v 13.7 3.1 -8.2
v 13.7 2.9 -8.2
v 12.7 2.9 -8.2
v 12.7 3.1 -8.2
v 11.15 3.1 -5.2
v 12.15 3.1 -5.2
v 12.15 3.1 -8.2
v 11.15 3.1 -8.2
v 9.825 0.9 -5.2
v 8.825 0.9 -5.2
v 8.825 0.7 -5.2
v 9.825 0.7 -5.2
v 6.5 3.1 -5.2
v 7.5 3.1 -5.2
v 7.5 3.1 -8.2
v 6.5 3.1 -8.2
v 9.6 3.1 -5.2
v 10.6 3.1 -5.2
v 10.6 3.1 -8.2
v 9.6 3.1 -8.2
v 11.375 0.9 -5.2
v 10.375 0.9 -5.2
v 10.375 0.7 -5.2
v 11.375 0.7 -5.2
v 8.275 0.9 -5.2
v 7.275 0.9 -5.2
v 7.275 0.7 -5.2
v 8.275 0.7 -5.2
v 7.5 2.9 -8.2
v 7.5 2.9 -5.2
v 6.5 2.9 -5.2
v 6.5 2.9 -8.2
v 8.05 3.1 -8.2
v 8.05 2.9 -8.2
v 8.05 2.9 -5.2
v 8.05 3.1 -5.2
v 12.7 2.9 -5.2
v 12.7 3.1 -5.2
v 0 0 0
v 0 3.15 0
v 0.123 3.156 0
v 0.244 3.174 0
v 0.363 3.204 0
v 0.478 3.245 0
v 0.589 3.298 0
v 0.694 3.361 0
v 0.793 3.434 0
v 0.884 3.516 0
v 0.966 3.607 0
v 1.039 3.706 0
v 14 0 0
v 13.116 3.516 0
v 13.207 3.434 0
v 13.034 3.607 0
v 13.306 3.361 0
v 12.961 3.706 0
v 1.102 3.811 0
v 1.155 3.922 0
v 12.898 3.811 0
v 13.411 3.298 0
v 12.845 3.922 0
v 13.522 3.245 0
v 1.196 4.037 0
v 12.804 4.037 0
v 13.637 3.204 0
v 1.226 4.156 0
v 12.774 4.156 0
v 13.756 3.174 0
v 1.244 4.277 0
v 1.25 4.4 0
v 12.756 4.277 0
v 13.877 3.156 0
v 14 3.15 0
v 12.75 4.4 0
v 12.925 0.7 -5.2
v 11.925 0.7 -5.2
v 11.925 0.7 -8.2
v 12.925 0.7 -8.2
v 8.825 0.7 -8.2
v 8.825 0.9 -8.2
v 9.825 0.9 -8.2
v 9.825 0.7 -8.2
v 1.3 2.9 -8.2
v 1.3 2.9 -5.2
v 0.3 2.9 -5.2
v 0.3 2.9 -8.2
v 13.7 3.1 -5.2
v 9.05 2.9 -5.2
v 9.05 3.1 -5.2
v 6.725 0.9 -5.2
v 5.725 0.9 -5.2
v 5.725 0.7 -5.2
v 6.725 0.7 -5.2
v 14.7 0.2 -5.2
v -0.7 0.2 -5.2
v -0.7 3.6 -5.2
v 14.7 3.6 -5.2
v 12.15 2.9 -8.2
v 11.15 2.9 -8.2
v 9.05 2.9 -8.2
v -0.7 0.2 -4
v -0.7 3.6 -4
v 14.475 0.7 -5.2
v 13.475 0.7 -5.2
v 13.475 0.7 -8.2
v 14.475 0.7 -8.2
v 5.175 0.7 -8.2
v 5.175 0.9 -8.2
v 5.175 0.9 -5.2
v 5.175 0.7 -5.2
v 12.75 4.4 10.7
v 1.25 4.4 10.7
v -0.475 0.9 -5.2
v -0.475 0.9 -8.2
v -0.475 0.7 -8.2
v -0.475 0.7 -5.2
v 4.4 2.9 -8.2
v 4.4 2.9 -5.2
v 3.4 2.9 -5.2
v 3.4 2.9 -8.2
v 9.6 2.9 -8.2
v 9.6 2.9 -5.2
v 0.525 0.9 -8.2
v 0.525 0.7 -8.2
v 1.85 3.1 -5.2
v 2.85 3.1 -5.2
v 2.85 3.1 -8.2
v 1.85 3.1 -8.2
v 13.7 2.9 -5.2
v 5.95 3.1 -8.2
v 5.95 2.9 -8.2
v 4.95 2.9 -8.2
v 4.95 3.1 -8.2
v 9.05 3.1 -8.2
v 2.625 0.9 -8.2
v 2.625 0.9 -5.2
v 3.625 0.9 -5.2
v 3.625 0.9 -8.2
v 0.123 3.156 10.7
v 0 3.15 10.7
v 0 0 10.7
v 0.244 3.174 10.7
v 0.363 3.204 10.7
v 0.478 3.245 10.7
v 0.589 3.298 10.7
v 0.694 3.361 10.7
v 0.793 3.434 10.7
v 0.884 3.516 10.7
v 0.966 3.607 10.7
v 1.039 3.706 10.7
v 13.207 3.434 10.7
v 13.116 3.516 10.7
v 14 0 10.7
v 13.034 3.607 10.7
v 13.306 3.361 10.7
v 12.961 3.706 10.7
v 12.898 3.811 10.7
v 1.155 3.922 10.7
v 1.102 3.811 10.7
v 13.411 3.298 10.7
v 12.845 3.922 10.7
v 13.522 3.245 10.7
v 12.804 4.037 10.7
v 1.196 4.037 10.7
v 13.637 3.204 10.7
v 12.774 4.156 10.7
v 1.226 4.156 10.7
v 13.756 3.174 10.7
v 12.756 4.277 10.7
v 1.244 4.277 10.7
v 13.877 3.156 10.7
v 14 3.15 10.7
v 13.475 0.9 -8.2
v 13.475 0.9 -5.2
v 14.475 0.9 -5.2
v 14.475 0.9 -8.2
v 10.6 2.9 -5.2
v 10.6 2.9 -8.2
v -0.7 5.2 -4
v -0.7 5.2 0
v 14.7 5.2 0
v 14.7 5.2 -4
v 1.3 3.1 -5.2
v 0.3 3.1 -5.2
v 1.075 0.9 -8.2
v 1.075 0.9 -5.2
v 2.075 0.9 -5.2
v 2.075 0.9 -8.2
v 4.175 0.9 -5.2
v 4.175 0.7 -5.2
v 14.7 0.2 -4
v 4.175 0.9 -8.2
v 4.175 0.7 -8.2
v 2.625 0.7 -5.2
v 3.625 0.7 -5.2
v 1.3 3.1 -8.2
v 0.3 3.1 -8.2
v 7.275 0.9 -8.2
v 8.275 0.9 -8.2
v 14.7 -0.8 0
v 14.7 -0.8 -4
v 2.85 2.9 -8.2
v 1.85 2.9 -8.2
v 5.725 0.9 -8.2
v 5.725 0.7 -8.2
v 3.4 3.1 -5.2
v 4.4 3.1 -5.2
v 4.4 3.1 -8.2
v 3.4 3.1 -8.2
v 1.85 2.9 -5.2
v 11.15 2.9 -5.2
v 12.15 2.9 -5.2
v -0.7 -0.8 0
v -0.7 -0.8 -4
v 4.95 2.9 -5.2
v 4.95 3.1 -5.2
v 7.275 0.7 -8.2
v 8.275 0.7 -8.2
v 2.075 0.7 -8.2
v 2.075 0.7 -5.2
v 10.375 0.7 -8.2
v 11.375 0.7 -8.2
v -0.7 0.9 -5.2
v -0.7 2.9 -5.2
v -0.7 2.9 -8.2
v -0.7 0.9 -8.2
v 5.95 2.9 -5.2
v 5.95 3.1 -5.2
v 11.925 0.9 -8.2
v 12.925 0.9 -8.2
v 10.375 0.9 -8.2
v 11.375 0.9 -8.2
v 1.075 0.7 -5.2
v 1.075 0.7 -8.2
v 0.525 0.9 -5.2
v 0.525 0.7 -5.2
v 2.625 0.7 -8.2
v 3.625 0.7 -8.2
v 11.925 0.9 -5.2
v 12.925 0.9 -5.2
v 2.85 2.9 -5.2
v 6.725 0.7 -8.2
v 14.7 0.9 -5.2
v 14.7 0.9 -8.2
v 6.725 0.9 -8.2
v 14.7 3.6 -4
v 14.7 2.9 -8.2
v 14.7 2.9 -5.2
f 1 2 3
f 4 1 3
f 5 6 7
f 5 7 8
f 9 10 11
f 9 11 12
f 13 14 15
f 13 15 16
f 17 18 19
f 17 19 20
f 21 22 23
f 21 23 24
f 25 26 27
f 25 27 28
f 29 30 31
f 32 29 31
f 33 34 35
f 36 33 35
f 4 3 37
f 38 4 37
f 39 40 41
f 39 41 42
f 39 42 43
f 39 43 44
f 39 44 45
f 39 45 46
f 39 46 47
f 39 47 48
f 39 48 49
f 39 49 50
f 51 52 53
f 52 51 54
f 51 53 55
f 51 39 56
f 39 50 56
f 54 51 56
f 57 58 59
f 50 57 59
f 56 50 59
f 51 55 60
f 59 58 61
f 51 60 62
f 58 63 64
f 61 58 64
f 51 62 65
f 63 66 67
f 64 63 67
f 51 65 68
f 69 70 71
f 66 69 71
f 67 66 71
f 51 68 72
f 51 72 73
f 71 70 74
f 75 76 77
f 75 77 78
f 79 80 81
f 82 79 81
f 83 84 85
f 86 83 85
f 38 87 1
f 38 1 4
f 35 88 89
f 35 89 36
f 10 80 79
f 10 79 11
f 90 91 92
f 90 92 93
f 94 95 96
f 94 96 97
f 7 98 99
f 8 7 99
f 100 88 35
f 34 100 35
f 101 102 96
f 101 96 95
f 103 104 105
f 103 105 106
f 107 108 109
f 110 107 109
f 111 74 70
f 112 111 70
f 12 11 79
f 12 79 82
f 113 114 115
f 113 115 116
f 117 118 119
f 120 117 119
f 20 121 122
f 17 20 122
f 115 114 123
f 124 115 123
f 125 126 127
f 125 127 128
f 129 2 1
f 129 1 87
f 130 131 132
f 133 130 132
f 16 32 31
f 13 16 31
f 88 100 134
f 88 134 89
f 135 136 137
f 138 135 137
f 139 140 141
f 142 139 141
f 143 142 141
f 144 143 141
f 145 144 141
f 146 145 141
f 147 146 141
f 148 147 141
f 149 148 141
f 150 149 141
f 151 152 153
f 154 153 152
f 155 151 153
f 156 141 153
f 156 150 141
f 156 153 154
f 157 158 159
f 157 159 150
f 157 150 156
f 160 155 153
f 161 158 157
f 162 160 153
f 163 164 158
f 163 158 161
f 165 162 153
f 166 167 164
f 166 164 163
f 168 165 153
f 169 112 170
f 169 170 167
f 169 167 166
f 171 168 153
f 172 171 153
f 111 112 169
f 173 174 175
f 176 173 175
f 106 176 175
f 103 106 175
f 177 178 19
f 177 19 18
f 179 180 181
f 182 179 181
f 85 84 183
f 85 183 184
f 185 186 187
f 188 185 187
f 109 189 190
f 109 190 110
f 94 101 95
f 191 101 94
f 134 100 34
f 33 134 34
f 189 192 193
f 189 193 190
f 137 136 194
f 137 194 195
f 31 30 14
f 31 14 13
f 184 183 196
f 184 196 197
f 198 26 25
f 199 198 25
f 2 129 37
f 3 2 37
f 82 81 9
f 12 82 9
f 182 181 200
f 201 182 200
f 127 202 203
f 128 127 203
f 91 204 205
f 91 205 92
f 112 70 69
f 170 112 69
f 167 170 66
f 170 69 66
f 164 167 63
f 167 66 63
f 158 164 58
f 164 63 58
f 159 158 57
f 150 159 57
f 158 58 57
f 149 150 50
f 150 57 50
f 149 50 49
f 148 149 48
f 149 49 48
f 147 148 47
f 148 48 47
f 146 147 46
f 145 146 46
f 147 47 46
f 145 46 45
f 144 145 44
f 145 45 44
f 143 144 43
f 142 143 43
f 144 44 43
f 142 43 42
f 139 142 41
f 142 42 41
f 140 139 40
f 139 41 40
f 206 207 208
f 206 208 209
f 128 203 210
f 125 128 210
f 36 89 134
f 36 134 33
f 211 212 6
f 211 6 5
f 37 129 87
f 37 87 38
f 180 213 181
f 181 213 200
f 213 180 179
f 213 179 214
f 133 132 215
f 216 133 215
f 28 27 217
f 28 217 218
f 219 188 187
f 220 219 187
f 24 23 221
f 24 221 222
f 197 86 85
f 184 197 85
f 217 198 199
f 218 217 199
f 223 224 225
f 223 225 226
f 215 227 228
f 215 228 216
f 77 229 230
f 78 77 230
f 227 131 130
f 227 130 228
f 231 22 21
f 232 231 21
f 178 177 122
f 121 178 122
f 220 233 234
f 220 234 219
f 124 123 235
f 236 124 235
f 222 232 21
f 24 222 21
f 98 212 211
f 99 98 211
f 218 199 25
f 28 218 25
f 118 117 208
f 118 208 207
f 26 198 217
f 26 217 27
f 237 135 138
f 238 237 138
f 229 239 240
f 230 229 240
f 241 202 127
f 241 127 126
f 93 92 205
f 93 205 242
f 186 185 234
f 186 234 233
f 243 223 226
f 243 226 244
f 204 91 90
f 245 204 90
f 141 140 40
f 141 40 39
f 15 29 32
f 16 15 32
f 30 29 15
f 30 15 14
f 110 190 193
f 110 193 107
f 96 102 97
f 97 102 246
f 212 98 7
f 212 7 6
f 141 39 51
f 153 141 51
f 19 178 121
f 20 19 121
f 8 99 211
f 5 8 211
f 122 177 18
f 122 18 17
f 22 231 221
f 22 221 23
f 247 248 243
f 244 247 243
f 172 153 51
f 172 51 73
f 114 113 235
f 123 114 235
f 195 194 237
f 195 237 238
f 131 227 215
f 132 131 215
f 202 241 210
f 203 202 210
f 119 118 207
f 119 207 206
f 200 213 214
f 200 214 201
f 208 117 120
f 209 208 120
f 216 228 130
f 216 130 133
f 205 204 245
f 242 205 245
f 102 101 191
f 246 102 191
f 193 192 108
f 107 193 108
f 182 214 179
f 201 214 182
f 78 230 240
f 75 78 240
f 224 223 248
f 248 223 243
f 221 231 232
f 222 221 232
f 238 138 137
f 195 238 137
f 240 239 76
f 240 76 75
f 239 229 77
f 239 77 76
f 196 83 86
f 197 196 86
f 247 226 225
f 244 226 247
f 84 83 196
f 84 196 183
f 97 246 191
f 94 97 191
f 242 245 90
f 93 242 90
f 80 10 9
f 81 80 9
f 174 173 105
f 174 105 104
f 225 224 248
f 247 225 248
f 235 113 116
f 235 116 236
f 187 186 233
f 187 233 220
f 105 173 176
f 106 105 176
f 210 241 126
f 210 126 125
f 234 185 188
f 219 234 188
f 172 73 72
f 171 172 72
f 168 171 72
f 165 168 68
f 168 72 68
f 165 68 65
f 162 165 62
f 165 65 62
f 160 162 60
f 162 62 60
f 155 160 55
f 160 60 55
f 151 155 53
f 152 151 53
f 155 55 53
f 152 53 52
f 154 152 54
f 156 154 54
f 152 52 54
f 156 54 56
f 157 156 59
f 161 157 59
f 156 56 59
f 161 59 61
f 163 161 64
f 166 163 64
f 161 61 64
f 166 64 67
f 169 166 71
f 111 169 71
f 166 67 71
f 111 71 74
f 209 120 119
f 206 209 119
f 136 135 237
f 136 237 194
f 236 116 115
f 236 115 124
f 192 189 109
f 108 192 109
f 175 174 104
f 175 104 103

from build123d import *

# Parameters (mm, degrees)
F1_DEPTH  = 10.7
F2_W      = 15.4
F2_H      = 6
F3_DEPTH  = 4
F4_W      = 15.4
F4_H      = 3.4
F5_DEPTH  = 1.2
F6_W      = 15.4
F6_H      = 2
F7_DEPTH  = 3
F8_W      = 1
F8_H      = 3
F9_DEPTH  = 0.2
F10_W     = 1
F10_H     = 3
F11_DEPTH = 0.2


with BuildPart() as f1:
    # F0 (on Top) → F1 (new body)
    with BuildSketch(Plane.XY):
        with BuildLine():
            Line((0, 3.15), (0, 0))
            Line((0, 0), (14, 0))
            Line((14, 0), (14, 3.15))
            ThreePointArc((14, 3.15), (13.1161165235, 3.5161165235), (12.75, 4.4))
            Line((12.75, 4.4), (1.25, 4.4))
            ThreePointArc((1.25, 4.4), (0.8838834765, 3.5161165235), (0, 3.15))
        make_face()
    extrude(amount=F1_DEPTH)


with BuildPart() as f3:
    # F2 (on face) → F3 (new body)
    with BuildSketch(Plane(origin=(0, 0, 0), x_dir=(1, 0, 0), z_dir=(0, 0, -1))):
        with Locations((7, -2.2)):
            Rectangle(F2_W, F2_H)
        with BuildLine():
            Line((0, -3.15), (0, 0))
            Line((0, 0), (14, 0))
            Line((14, 0), (14, -3.15))
            ThreePointArc((14, -3.15), (13.1161165235, -3.5161165235), (12.75, -4.4))
            Line((12.75, -4.4), (1.25, -4.4))
            ThreePointArc((1.25, -4.4), (0.8838834765, -3.5161165235), (0, -3.15))
        make_face(mode=Mode.SUBTRACT)
        with BuildLine():
            Line((14, 0), (0, 0))
            Line((0, 0), (0, -3.15))
            ThreePointArc((0, -3.15), (0.8838834765, -3.5161165235), (1.25, -4.4))
            Line((1.25, -4.4), (12.75, -4.4))
            ThreePointArc((12.75, -4.4), (13.1161165235, -3.5161165235), (14, -3.15))
            Line((14, -3.15), (14, 0))
        make_face()
    extrude(amount=F3_DEPTH)


with BuildPart() as f5:
    # F4 (on face) → F5 (new body)
    with BuildSketch(Plane(origin=(0, 0, -4), x_dir=(1, 0, 0), z_dir=(0, 0, -1))):
        with Locations((7, -1.9)):
            Rectangle(F4_W, F4_H)
    extrude(amount=F5_DEPTH)


with BuildPart() as f7:
    # F6 (on face) → F7 (new body)
    with BuildSketch(Plane(origin=(0, 0, -5.2), x_dir=(1, 0, 0), z_dir=(0, 0, -1))):
        with Locations((7, -1.9)):
            Rectangle(F6_W, F6_H)
    extrude(amount=F7_DEPTH)


with BuildPart() as f9:
    # F8 (on face) → F9 (new body)
    with BuildSketch(Plane.XZ.offset(-0.9)):
        with Locations((0.025, -6.7)):
            Rectangle(F8_W, F8_H)
    extrude(amount=F9_DEPTH)


with BuildPart() as f9b:
    # F8 (on face) → F9, piece 2 (new body)
    with BuildSketch(Plane.XZ.offset(-0.9)):
        with Locations((1.575, -6.7)):
            Rectangle(F8_W, F8_H)
    extrude(amount=F9_DEPTH)


with BuildPart() as f9c:
    # F8 (on face) → F9, piece 3 (new body)
    with BuildSketch(Plane.XZ.offset(-0.9)):
        with Locations((3.125, -6.7)):
            Rectangle(F8_W, F8_H)
    extrude(amount=F9_DEPTH)


with BuildPart() as f9d:
    # F8 (on face) → F9, piece 4 (new body)
    with BuildSketch(Plane.XZ.offset(-0.9)):
        with Locations((4.675, -6.7)):
            Rectangle(F8_W, F8_H)
    extrude(amount=F9_DEPTH)


with BuildPart() as f9e:
    # F8 (on face) → F9, piece 5 (new body)
    with BuildSketch(Plane.XZ.offset(-0.9)):
        with Locations((6.225, -6.7)):
            Rectangle(F8_W, F8_H)
    extrude(amount=F9_DEPTH)


with BuildPart() as f9f:
    # F8 (on face) → F9, piece 6 (new body)
    with BuildSketch(Plane.XZ.offset(-0.9)):
        with Locations((7.775, -6.7)):
            Rectangle(F8_W, F8_H)
    extrude(amount=F9_DEPTH)


with BuildPart() as f9g:
    # F8 (on face) → F9, piece 7 (new body)
    with BuildSketch(Plane.XZ.offset(-0.9)):
        with Locations((9.325, -6.7)):
            Rectangle(F8_W, F8_H)
    extrude(amount=F9_DEPTH)


with BuildPart() as f9h:
    # F8 (on face) → F9, piece 8 (new body)
    with BuildSketch(Plane.XZ.offset(-0.9)):
        with Locations((10.875, -6.7)):
            Rectangle(F8_W, F8_H)
    extrude(amount=F9_DEPTH)


with BuildPart() as f9i:
    # F8 (on face) → F9, piece 9 (new body)
    with BuildSketch(Plane.XZ.offset(-0.9)):
        with Locations((12.425, -6.7)):
            Rectangle(F8_W, F8_H)
    extrude(amount=F9_DEPTH)


with BuildPart() as f9j:
    # F8 (on face) → F9, piece 10 (new body)
    with BuildSketch(Plane.XZ.offset(-0.9)):
        with Locations((13.975, -6.7)):
            Rectangle(F8_W, F8_H)
    extrude(amount=F9_DEPTH)


with BuildPart() as f11:
    # F10 (on face) → F11 (new body)
    with BuildSketch(Plane(origin=(0, 2.9, 0), x_dir=(-1, 0, 0), z_dir=(0, 1, 0))):
        with Locations((-13.2, -6.7)):
            Rectangle(F10_W, F10_H)
    extrude(amount=F11_DEPTH)


with BuildPart() as f11b:
    # F10 (on face) → F11, piece 2 (new body)
    with BuildSketch(Plane(origin=(0, 2.9, 0), x_dir=(-1, 0, 0), z_dir=(0, 1, 0))):
        with Locations((-11.65, -6.7)):
            Rectangle(F10_W, F10_H)
    extrude(amount=F11_DEPTH)


with BuildPart() as f11c:
    # F10 (on face) → F11, piece 3 (new body)
    with BuildSketch(Plane(origin=(0, 2.9, 0), x_dir=(-1, 0, 0), z_dir=(0, 1, 0))):
        with Locations((-10.1, -6.7)):
            Rectangle(F10_W, F10_H)
    extrude(amount=F11_DEPTH)


with BuildPart() as f11d:
    # F10 (on face) → F11, piece 4 (new body)
    with BuildSketch(Plane(origin=(0, 2.9, 0), x_dir=(-1, 0, 0), z_dir=(0, 1, 0))):
        with Locations((-8.55, -6.7)):
            Rectangle(F10_W, F10_H)
    extrude(amount=F11_DEPTH)


with BuildPart() as f11e:
    # F10 (on face) → F11, piece 5 (new body)
    with BuildSketch(Plane(origin=(0, 2.9, 0), x_dir=(-1, 0, 0), z_dir=(0, 1, 0))):
        with Locations((-7, -6.7)):
            Rectangle(F10_W, F10_H)
    extrude(amount=F11_DEPTH)


with BuildPart() as f11f:
    # F10 (on face) → F11, piece 6 (new body)
    with BuildSketch(Plane(origin=(0, 2.9, 0), x_dir=(-1, 0, 0), z_dir=(0, 1, 0))):
        with Locations((-5.45, -6.7)):
            Rectangle(F10_W, F10_H)
    extrude(amount=F11_DEPTH)


with BuildPart() as f11g:
    # F10 (on face) → F11, piece 7 (new body)
    with BuildSketch(Plane(origin=(0, 2.9, 0), x_dir=(-1, 0, 0), z_dir=(0, 1, 0))):
        with Locations((-3.9, -6.7)):
            Rectangle(F10_W, F10_H)
    extrude(amount=F11_DEPTH)


with BuildPart() as f11h:
    # F10 (on face) → F11, piece 8 (new body)
    with BuildSketch(Plane(origin=(0, 2.9, 0), x_dir=(-1, 0, 0), z_dir=(0, 1, 0))):
        with Locations((-2.35, -6.7)):
            Rectangle(F10_W, F10_H)
    extrude(amount=F11_DEPTH)


with BuildPart() as f11i:
    # F10 (on face) → F11, piece 9 (new body)
    with BuildSketch(Plane(origin=(0, 2.9, 0), x_dir=(-1, 0, 0), z_dir=(0, 1, 0))):
        with Locations((-0.8, -6.7)):
            Rectangle(F10_W, F10_H)
    extrude(amount=F11_DEPTH)


solid = Compound([f1.part, f3.part, f5.part, f7.part, f9.part, f9b.part, f9c.part, f9d.part, f9e.part, f9f.part, f9g.part, f9h.part, f9i.part, f9j.part, f11.part, f11b.part, f11c.part, f11d.part, f11e.part, f11f.part, f11g.part, f11h.part, f11i.part])
